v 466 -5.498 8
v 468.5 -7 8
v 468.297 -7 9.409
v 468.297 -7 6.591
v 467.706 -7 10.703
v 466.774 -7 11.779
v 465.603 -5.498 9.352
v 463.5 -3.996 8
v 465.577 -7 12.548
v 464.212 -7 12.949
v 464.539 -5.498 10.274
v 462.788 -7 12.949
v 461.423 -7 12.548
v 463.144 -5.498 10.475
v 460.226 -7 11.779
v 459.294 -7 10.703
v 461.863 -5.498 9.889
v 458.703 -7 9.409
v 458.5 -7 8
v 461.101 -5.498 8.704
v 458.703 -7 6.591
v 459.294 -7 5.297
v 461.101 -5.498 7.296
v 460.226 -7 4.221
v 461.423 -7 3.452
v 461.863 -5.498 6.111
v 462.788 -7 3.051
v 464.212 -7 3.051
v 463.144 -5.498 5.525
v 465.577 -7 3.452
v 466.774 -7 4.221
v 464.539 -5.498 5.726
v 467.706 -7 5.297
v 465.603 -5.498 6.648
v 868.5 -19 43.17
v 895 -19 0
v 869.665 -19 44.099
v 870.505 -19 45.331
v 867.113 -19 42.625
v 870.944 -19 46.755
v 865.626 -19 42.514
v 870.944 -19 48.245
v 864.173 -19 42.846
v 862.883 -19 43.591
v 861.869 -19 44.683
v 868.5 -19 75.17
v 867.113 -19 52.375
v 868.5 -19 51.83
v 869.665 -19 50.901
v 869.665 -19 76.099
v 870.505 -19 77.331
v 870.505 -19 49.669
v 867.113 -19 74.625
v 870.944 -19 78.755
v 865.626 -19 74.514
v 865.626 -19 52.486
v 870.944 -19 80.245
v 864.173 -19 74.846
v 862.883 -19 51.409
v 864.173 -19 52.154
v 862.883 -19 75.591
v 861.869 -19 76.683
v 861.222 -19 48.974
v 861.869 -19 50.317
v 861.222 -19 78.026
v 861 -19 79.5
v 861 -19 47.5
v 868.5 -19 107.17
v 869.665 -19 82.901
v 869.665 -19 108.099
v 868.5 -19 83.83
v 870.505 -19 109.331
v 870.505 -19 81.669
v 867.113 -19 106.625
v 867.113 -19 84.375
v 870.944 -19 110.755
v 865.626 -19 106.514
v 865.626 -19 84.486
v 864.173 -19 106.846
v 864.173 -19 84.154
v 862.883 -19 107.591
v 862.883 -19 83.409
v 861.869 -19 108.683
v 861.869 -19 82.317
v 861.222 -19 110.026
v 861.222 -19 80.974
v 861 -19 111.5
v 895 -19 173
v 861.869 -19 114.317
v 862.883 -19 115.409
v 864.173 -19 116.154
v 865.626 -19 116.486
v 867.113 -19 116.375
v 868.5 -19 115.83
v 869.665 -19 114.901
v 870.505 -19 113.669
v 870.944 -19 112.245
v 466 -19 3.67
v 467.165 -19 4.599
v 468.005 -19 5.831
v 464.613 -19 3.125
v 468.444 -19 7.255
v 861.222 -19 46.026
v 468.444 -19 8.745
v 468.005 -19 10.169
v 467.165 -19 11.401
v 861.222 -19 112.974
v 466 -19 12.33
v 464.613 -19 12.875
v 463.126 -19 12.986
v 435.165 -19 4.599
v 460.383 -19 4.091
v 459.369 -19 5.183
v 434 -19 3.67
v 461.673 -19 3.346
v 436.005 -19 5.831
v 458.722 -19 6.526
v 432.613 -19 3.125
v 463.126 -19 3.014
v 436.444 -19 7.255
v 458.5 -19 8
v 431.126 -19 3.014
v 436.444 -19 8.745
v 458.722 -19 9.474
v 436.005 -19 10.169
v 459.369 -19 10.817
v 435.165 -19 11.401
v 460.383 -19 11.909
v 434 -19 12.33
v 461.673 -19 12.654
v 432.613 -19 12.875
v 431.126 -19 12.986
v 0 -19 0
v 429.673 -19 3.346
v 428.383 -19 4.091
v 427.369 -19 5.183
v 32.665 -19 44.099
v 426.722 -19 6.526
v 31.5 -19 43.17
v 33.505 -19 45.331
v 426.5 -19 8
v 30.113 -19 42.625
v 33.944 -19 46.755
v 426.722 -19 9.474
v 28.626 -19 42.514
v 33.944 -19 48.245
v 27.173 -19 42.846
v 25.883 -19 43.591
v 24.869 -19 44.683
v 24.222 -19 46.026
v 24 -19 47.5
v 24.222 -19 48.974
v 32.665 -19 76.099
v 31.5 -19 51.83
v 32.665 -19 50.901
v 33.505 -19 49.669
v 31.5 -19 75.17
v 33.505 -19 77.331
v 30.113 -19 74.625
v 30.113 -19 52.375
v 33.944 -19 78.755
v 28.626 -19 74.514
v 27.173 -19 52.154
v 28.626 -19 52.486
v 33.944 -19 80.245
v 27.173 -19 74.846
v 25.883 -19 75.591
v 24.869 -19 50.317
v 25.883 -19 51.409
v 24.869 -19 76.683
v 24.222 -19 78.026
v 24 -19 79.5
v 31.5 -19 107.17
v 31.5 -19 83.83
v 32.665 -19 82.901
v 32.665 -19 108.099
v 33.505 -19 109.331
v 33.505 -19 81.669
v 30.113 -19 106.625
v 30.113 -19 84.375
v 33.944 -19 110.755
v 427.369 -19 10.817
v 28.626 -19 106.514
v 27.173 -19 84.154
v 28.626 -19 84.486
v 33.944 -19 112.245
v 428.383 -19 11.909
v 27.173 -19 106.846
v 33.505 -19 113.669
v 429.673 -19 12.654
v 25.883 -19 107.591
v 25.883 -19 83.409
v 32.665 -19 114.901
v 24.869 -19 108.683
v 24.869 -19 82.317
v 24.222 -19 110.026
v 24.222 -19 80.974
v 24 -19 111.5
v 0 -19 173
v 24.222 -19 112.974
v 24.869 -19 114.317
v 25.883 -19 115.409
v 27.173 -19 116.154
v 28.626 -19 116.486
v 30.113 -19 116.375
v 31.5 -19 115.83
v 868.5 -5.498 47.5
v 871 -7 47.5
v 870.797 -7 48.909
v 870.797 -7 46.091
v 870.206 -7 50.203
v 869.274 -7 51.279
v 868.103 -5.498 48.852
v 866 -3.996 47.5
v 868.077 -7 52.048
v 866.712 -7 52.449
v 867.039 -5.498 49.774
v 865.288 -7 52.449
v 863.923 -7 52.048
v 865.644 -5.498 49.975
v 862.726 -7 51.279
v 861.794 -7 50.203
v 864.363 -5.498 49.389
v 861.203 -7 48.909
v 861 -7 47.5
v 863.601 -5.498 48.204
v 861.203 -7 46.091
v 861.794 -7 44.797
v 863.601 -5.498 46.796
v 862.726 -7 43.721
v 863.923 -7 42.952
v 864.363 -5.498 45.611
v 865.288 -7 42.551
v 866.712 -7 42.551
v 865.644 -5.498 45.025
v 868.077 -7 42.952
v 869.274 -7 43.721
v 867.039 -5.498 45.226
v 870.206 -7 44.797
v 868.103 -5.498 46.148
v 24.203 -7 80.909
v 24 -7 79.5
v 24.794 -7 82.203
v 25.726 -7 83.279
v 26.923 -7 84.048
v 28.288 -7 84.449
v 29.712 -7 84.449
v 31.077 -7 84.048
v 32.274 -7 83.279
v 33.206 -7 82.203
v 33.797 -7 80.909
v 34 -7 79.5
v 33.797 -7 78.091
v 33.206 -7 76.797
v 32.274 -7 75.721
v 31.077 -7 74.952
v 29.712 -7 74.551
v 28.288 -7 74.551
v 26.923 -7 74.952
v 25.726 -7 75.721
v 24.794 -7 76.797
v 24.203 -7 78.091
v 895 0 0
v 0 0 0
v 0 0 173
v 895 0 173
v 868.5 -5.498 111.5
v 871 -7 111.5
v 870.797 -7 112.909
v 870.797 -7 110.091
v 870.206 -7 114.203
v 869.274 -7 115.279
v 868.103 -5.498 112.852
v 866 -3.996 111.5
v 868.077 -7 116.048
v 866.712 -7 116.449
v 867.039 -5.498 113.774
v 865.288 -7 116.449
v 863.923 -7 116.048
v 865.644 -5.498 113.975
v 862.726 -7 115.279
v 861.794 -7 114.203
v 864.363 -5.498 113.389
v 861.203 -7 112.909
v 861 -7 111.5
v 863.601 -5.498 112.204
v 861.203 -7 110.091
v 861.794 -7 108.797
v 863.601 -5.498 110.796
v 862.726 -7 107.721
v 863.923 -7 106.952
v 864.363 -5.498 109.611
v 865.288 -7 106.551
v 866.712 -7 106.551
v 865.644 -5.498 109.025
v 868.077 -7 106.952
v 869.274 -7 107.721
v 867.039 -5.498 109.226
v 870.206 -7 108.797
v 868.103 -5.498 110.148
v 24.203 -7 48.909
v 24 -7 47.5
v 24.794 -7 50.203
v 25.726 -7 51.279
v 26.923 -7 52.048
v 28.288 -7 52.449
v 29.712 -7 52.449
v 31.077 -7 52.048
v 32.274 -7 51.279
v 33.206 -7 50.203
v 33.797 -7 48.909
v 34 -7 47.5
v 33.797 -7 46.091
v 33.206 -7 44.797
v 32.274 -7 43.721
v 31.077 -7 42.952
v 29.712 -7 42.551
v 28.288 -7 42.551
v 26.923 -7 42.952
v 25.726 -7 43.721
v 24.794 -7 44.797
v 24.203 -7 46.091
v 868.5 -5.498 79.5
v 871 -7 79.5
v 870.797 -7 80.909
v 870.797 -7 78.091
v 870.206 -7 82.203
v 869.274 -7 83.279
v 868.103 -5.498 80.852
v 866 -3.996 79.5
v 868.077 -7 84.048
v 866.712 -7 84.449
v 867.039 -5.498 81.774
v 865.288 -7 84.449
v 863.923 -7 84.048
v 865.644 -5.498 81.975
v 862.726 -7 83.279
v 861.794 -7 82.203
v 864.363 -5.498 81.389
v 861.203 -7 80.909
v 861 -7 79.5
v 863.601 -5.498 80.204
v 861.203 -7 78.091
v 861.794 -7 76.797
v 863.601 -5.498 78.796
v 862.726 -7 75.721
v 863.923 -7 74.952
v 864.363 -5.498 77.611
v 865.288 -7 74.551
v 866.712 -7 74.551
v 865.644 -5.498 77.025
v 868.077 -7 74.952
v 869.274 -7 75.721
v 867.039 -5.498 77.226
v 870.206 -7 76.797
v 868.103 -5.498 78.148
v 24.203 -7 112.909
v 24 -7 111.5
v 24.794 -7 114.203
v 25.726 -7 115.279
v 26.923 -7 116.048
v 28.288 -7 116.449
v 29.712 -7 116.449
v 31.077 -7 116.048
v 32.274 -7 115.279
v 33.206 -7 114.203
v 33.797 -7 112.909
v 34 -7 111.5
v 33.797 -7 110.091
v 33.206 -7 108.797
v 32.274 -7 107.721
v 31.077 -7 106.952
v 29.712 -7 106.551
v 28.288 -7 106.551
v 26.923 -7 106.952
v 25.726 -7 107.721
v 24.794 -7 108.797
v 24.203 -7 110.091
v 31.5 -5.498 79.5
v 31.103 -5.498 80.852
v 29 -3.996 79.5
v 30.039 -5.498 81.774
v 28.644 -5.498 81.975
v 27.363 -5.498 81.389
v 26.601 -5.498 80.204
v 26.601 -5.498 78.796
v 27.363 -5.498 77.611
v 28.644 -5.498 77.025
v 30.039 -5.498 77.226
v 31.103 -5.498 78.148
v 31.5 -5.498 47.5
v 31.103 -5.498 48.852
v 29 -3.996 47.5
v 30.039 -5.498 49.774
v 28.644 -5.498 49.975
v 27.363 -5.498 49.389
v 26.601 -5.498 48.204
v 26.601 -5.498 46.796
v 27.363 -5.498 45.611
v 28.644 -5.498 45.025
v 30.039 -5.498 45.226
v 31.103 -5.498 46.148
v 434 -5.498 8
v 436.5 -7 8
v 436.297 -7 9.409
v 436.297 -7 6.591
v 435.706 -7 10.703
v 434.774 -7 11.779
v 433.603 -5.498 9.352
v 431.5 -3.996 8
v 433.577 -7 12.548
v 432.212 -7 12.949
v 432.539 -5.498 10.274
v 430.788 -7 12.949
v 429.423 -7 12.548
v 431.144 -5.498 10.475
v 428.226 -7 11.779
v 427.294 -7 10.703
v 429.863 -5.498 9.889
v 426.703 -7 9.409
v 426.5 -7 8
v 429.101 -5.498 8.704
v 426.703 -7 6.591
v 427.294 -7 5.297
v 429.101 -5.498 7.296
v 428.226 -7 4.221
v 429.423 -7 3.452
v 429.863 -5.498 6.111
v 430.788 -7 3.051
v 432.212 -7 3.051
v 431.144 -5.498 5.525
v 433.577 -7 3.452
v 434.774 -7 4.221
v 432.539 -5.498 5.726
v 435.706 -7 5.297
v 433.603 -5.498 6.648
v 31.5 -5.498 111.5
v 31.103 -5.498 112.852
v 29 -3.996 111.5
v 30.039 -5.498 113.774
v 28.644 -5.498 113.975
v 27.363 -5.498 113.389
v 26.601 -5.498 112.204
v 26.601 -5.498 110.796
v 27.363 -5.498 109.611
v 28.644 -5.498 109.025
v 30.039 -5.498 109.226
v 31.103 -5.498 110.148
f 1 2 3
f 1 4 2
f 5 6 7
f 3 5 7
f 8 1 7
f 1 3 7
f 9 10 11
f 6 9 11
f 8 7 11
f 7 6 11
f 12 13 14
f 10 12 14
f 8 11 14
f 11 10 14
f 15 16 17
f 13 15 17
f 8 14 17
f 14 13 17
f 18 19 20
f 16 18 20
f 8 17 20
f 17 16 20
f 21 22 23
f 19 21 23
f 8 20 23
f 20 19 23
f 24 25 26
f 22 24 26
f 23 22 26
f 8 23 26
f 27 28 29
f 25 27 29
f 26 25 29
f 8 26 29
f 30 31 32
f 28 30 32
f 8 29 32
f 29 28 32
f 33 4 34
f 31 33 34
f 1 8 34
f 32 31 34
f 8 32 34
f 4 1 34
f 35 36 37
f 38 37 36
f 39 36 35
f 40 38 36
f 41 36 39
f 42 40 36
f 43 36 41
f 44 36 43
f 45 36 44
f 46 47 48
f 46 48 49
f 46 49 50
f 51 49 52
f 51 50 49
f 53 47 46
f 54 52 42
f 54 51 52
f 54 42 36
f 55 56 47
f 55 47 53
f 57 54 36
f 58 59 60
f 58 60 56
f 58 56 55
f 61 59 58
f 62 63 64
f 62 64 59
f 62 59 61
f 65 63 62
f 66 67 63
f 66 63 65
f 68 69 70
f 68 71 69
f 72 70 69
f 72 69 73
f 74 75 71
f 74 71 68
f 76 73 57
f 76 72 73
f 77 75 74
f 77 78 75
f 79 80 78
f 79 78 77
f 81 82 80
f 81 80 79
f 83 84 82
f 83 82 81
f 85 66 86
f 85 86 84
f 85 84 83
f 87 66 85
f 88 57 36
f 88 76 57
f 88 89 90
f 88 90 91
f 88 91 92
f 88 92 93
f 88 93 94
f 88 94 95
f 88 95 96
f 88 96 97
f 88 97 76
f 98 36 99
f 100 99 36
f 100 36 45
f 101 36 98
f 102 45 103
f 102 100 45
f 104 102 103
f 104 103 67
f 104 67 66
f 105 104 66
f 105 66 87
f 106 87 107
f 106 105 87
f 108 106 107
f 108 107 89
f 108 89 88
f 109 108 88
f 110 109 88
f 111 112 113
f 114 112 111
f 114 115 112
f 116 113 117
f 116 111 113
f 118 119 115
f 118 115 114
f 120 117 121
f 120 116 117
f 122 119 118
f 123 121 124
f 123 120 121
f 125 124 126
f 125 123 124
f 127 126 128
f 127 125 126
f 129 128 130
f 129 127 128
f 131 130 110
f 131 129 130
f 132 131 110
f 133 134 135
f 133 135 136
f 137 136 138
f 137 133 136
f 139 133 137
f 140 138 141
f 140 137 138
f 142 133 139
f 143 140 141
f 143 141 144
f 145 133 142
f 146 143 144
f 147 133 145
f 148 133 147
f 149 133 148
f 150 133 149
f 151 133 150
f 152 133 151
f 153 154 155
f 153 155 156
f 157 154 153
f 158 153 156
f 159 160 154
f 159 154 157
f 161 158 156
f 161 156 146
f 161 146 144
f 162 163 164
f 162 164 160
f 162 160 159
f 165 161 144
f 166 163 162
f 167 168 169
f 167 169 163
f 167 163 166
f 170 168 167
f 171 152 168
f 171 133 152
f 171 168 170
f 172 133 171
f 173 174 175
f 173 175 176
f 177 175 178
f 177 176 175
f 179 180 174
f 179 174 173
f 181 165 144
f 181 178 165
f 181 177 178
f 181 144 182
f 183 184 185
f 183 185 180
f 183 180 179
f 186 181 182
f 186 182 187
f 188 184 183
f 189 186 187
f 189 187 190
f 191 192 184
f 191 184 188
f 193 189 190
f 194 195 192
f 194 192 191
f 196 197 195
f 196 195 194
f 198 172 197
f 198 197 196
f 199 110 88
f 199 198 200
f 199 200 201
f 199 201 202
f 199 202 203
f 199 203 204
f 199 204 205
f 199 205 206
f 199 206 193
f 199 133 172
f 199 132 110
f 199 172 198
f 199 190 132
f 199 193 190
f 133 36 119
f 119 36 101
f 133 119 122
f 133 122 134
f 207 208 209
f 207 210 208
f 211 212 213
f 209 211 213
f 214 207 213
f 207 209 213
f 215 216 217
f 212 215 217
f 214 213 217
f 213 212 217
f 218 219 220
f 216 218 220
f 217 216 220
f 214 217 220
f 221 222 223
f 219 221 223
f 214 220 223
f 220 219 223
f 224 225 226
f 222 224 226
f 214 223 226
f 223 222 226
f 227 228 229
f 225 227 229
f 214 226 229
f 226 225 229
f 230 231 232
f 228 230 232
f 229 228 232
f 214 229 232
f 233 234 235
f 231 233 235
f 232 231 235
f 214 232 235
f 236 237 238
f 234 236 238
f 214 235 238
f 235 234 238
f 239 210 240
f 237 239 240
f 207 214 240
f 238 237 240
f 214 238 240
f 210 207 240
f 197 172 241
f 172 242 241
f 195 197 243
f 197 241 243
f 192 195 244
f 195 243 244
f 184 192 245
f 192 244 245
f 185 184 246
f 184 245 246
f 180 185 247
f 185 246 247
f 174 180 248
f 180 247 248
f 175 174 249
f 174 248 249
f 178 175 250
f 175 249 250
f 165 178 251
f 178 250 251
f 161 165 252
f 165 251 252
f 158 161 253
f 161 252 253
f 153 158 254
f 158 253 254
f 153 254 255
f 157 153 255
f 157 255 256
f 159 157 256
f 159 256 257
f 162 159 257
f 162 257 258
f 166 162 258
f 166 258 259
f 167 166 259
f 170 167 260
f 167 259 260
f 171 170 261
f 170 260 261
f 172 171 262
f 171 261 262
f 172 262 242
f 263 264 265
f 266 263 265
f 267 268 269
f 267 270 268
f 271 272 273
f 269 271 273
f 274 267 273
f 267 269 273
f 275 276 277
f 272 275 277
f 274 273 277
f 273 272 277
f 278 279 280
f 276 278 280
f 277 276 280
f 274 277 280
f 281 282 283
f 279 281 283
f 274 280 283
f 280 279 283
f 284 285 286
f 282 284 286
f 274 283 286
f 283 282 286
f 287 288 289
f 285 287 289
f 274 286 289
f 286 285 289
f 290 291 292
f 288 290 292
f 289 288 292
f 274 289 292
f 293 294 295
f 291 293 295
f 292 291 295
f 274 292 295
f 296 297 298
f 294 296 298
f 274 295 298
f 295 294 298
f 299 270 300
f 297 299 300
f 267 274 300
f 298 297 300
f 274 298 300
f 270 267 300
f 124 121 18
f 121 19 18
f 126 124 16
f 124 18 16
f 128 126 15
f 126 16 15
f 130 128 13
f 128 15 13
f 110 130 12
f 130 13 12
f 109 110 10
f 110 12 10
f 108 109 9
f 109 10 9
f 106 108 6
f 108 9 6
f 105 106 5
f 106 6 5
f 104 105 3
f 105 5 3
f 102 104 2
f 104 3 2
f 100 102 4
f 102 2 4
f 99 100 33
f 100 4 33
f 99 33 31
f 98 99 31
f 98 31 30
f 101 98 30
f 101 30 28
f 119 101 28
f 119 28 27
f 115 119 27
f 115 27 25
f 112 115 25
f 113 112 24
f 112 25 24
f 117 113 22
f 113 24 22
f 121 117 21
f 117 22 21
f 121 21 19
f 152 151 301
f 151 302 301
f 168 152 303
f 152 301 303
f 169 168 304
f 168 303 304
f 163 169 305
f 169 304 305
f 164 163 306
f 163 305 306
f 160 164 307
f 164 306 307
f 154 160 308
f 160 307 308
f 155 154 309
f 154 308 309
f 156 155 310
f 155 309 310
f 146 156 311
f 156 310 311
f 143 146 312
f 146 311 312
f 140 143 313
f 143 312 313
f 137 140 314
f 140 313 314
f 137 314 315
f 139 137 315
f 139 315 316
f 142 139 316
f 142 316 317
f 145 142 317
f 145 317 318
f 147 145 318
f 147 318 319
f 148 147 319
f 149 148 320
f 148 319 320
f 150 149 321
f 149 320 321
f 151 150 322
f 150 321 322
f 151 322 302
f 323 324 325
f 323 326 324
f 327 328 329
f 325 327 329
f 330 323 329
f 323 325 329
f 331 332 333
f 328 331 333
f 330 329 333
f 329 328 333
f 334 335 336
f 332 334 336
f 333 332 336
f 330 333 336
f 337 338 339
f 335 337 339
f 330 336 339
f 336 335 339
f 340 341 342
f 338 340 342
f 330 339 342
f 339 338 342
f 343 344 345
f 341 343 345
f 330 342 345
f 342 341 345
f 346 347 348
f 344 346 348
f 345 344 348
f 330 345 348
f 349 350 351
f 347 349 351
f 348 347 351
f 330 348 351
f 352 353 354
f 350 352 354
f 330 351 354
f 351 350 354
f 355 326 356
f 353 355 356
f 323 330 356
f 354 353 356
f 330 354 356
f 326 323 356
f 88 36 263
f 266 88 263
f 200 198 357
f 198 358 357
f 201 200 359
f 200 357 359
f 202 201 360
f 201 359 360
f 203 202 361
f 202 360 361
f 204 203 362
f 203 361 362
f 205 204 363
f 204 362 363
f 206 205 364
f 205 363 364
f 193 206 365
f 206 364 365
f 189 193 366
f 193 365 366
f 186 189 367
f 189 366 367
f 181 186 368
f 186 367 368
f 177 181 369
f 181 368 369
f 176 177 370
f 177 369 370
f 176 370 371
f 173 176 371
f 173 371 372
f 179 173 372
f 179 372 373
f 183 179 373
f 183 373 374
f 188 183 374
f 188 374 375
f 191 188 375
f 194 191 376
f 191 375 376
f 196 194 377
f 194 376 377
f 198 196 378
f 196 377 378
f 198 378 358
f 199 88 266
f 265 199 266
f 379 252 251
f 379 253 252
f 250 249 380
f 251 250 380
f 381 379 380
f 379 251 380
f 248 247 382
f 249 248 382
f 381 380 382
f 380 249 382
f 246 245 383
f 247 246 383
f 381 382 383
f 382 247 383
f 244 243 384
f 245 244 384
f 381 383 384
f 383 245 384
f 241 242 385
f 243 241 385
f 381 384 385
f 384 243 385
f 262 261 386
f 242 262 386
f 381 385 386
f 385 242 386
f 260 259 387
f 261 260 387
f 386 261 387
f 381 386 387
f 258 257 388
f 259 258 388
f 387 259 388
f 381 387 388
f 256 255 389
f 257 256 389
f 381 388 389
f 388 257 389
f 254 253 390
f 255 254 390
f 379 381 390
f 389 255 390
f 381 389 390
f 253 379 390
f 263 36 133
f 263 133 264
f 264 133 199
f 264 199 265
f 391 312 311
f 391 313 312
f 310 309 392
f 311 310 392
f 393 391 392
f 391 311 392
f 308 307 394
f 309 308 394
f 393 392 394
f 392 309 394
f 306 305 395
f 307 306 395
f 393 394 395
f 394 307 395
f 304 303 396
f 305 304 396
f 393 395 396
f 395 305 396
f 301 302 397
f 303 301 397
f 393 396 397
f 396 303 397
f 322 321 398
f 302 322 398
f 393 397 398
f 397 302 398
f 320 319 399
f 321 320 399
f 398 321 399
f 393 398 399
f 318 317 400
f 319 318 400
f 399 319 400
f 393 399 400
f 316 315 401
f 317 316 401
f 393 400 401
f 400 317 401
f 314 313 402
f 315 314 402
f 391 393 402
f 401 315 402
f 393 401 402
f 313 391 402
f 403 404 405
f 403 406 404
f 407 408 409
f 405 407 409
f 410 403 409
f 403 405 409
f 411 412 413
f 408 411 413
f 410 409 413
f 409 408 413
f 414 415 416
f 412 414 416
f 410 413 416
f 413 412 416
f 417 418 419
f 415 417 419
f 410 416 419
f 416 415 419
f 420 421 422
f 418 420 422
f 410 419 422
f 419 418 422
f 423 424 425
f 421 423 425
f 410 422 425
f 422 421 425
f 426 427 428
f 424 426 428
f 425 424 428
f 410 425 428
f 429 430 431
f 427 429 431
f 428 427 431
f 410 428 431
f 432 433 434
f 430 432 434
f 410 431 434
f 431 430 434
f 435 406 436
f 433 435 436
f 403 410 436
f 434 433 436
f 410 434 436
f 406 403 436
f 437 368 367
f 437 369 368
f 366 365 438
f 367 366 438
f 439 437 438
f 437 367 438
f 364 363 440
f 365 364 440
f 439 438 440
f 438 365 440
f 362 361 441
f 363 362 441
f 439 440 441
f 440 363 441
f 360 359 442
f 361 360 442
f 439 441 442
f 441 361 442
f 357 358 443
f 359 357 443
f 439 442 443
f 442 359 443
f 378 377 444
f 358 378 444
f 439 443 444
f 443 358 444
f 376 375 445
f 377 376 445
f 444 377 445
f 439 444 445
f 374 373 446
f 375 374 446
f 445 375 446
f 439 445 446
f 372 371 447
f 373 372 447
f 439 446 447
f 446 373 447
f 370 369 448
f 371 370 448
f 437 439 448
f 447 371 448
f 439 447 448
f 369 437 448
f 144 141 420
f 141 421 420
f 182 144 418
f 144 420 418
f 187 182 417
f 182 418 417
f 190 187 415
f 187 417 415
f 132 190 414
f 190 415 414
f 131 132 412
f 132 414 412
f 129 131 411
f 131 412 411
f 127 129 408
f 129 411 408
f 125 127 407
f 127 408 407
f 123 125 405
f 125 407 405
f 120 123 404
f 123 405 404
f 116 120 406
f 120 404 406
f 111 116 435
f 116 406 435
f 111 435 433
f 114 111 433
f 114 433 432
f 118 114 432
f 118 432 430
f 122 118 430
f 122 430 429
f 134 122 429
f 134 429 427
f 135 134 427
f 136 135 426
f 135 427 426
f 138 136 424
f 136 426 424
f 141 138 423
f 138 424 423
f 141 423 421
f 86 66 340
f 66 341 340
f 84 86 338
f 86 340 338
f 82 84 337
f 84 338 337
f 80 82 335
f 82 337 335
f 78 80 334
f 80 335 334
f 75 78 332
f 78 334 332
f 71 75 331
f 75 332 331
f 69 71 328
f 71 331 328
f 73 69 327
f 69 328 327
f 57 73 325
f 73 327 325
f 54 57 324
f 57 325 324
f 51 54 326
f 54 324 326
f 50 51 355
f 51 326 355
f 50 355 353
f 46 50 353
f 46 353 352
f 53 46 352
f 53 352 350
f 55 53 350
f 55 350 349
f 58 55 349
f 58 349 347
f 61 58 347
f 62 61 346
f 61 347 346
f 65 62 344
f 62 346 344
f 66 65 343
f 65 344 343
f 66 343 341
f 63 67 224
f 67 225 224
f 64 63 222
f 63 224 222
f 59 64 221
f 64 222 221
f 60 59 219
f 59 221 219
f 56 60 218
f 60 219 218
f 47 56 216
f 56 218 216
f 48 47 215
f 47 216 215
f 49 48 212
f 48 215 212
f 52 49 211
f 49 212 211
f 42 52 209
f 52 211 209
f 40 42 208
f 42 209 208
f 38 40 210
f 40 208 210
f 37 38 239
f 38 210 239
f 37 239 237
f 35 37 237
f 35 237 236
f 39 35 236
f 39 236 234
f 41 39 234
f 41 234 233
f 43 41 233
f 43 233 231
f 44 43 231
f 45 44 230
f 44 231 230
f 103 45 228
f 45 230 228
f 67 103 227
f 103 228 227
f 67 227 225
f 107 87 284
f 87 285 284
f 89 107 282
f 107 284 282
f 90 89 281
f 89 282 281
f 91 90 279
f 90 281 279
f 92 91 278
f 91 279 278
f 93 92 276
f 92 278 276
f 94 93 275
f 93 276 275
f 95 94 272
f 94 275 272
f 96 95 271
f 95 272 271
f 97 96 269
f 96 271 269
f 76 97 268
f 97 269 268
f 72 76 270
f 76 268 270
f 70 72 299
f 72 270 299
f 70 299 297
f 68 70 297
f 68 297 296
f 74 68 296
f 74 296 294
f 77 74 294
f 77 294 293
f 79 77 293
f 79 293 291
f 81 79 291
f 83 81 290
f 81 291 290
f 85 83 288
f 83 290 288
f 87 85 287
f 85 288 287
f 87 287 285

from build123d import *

# Parameters (mm, degrees)
F0_W     = 19
F0_H     = 173
F1_DEPTH = 895
F3_D     = 10
F3_DEPTH = 12
F3_TIP   = 3.0043030951


with BuildPart() as f1:
    # F0 (on Right) → F1 (new body)
    with BuildSketch(Plane.YZ):
        with Locations((-9.5, 86.5)):
            Rectangle(F0_W, F0_H)
    extrude(amount=F1_DEPTH)

    # F3
    with Locations(Plane.XZ.offset(19)):
        with Locations((29, 111.5), (29, 79.5), (29, 47.5), (431.5, 8), (463.5, 8), (866, 47.5), (866, 79.5), (866, 111.5)):
            Hole(F3_D / 2, depth=F3_DEPTH)
            with Locations((0, 0, -(F3_DEPTH + F3_TIP / 2))):  # 118° drill point
                Cone(0, F3_D / 2, F3_TIP, mode=Mode.SUBTRACT)


solid = f1.part
